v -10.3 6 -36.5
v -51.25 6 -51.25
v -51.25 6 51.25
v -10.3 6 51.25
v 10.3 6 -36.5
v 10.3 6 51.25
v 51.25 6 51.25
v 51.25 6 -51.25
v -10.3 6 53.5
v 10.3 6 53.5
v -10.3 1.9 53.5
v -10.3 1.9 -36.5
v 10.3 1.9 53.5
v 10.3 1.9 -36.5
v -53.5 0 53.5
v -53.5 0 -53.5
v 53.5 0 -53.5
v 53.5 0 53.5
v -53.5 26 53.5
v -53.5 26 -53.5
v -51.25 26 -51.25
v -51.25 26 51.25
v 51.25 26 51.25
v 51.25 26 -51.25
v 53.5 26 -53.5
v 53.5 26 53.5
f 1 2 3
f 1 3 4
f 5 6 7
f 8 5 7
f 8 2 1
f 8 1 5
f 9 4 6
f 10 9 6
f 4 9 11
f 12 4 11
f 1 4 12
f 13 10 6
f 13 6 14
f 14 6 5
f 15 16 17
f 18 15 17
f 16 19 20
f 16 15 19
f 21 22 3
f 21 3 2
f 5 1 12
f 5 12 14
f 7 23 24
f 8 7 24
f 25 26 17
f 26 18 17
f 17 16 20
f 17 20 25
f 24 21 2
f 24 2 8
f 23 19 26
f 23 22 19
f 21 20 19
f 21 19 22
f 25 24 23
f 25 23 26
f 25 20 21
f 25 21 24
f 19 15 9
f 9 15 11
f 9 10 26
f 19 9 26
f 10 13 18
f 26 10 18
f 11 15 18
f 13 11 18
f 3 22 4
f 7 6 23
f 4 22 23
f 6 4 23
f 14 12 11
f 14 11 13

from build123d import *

# Parameters (mm, degrees)
SKETCH2_W           = 107
SKETCH2_H           = 107
BOSS_EXTRUDE1_DEPTH = 8
SKETCH14_W          = 107
SKETCH14_H          = 107
BOSS_EXTRUDE2_DEPTH = 18
SKETCH15_W          = 102.5
SKETCH15_H          = 102.5
CUT_EXTRUDE4_DEPTH  = 20
SKETCH12_W          = 20.6
SKETCH12_H          = 90.000135975
CUT_EXTRUDE3_DEPTH  = 4.1


with BuildPart() as part:
    # Sketch2 → Boss-Extrude1 (new body)
    with BuildSketch(Plane(origin=(0, 0, 0), x_dir=(1, 0, 0), z_dir=(0, 1, 0))):
        Rectangle(SKETCH2_W, SKETCH2_H)
    extrude(amount=BOSS_EXTRUDE1_DEPTH)

    # Sketch14 → Boss-Extrude2 (add)
    with BuildSketch(Plane(origin=(0, 8, 0), x_dir=(1, 0, 0), z_dir=(0, 1, 0))):
        Rectangle(SKETCH14_W, SKETCH14_H)
    extrude(amount=BOSS_EXTRUDE2_DEPTH)

    # Sketch15 → Cut-Extrude4 (cut)
    with BuildSketch(Plane(origin=(0, 26, 0), x_dir=(1, 0, 0), z_dir=(0, 1, 0))):
        Rectangle(SKETCH15_W, SKETCH15_H)
    extrude(amount=-CUT_EXTRUDE4_DEPTH, mode=Mode.SUBTRACT)

    # Sketch12 → Cut-Extrude3 (cut)
    with BuildSketch(Plane(origin=(0, 6, 0), x_dir=(1, 0, 0), z_dir=(0, 1, 0))):
        with Locations((0, -8.499932013)):
            Rectangle(SKETCH12_W, SKETCH12_H)
    extrude(amount=-CUT_EXTRUDE3_DEPTH, mode=Mode.SUBTRACT)


solid = part.part
